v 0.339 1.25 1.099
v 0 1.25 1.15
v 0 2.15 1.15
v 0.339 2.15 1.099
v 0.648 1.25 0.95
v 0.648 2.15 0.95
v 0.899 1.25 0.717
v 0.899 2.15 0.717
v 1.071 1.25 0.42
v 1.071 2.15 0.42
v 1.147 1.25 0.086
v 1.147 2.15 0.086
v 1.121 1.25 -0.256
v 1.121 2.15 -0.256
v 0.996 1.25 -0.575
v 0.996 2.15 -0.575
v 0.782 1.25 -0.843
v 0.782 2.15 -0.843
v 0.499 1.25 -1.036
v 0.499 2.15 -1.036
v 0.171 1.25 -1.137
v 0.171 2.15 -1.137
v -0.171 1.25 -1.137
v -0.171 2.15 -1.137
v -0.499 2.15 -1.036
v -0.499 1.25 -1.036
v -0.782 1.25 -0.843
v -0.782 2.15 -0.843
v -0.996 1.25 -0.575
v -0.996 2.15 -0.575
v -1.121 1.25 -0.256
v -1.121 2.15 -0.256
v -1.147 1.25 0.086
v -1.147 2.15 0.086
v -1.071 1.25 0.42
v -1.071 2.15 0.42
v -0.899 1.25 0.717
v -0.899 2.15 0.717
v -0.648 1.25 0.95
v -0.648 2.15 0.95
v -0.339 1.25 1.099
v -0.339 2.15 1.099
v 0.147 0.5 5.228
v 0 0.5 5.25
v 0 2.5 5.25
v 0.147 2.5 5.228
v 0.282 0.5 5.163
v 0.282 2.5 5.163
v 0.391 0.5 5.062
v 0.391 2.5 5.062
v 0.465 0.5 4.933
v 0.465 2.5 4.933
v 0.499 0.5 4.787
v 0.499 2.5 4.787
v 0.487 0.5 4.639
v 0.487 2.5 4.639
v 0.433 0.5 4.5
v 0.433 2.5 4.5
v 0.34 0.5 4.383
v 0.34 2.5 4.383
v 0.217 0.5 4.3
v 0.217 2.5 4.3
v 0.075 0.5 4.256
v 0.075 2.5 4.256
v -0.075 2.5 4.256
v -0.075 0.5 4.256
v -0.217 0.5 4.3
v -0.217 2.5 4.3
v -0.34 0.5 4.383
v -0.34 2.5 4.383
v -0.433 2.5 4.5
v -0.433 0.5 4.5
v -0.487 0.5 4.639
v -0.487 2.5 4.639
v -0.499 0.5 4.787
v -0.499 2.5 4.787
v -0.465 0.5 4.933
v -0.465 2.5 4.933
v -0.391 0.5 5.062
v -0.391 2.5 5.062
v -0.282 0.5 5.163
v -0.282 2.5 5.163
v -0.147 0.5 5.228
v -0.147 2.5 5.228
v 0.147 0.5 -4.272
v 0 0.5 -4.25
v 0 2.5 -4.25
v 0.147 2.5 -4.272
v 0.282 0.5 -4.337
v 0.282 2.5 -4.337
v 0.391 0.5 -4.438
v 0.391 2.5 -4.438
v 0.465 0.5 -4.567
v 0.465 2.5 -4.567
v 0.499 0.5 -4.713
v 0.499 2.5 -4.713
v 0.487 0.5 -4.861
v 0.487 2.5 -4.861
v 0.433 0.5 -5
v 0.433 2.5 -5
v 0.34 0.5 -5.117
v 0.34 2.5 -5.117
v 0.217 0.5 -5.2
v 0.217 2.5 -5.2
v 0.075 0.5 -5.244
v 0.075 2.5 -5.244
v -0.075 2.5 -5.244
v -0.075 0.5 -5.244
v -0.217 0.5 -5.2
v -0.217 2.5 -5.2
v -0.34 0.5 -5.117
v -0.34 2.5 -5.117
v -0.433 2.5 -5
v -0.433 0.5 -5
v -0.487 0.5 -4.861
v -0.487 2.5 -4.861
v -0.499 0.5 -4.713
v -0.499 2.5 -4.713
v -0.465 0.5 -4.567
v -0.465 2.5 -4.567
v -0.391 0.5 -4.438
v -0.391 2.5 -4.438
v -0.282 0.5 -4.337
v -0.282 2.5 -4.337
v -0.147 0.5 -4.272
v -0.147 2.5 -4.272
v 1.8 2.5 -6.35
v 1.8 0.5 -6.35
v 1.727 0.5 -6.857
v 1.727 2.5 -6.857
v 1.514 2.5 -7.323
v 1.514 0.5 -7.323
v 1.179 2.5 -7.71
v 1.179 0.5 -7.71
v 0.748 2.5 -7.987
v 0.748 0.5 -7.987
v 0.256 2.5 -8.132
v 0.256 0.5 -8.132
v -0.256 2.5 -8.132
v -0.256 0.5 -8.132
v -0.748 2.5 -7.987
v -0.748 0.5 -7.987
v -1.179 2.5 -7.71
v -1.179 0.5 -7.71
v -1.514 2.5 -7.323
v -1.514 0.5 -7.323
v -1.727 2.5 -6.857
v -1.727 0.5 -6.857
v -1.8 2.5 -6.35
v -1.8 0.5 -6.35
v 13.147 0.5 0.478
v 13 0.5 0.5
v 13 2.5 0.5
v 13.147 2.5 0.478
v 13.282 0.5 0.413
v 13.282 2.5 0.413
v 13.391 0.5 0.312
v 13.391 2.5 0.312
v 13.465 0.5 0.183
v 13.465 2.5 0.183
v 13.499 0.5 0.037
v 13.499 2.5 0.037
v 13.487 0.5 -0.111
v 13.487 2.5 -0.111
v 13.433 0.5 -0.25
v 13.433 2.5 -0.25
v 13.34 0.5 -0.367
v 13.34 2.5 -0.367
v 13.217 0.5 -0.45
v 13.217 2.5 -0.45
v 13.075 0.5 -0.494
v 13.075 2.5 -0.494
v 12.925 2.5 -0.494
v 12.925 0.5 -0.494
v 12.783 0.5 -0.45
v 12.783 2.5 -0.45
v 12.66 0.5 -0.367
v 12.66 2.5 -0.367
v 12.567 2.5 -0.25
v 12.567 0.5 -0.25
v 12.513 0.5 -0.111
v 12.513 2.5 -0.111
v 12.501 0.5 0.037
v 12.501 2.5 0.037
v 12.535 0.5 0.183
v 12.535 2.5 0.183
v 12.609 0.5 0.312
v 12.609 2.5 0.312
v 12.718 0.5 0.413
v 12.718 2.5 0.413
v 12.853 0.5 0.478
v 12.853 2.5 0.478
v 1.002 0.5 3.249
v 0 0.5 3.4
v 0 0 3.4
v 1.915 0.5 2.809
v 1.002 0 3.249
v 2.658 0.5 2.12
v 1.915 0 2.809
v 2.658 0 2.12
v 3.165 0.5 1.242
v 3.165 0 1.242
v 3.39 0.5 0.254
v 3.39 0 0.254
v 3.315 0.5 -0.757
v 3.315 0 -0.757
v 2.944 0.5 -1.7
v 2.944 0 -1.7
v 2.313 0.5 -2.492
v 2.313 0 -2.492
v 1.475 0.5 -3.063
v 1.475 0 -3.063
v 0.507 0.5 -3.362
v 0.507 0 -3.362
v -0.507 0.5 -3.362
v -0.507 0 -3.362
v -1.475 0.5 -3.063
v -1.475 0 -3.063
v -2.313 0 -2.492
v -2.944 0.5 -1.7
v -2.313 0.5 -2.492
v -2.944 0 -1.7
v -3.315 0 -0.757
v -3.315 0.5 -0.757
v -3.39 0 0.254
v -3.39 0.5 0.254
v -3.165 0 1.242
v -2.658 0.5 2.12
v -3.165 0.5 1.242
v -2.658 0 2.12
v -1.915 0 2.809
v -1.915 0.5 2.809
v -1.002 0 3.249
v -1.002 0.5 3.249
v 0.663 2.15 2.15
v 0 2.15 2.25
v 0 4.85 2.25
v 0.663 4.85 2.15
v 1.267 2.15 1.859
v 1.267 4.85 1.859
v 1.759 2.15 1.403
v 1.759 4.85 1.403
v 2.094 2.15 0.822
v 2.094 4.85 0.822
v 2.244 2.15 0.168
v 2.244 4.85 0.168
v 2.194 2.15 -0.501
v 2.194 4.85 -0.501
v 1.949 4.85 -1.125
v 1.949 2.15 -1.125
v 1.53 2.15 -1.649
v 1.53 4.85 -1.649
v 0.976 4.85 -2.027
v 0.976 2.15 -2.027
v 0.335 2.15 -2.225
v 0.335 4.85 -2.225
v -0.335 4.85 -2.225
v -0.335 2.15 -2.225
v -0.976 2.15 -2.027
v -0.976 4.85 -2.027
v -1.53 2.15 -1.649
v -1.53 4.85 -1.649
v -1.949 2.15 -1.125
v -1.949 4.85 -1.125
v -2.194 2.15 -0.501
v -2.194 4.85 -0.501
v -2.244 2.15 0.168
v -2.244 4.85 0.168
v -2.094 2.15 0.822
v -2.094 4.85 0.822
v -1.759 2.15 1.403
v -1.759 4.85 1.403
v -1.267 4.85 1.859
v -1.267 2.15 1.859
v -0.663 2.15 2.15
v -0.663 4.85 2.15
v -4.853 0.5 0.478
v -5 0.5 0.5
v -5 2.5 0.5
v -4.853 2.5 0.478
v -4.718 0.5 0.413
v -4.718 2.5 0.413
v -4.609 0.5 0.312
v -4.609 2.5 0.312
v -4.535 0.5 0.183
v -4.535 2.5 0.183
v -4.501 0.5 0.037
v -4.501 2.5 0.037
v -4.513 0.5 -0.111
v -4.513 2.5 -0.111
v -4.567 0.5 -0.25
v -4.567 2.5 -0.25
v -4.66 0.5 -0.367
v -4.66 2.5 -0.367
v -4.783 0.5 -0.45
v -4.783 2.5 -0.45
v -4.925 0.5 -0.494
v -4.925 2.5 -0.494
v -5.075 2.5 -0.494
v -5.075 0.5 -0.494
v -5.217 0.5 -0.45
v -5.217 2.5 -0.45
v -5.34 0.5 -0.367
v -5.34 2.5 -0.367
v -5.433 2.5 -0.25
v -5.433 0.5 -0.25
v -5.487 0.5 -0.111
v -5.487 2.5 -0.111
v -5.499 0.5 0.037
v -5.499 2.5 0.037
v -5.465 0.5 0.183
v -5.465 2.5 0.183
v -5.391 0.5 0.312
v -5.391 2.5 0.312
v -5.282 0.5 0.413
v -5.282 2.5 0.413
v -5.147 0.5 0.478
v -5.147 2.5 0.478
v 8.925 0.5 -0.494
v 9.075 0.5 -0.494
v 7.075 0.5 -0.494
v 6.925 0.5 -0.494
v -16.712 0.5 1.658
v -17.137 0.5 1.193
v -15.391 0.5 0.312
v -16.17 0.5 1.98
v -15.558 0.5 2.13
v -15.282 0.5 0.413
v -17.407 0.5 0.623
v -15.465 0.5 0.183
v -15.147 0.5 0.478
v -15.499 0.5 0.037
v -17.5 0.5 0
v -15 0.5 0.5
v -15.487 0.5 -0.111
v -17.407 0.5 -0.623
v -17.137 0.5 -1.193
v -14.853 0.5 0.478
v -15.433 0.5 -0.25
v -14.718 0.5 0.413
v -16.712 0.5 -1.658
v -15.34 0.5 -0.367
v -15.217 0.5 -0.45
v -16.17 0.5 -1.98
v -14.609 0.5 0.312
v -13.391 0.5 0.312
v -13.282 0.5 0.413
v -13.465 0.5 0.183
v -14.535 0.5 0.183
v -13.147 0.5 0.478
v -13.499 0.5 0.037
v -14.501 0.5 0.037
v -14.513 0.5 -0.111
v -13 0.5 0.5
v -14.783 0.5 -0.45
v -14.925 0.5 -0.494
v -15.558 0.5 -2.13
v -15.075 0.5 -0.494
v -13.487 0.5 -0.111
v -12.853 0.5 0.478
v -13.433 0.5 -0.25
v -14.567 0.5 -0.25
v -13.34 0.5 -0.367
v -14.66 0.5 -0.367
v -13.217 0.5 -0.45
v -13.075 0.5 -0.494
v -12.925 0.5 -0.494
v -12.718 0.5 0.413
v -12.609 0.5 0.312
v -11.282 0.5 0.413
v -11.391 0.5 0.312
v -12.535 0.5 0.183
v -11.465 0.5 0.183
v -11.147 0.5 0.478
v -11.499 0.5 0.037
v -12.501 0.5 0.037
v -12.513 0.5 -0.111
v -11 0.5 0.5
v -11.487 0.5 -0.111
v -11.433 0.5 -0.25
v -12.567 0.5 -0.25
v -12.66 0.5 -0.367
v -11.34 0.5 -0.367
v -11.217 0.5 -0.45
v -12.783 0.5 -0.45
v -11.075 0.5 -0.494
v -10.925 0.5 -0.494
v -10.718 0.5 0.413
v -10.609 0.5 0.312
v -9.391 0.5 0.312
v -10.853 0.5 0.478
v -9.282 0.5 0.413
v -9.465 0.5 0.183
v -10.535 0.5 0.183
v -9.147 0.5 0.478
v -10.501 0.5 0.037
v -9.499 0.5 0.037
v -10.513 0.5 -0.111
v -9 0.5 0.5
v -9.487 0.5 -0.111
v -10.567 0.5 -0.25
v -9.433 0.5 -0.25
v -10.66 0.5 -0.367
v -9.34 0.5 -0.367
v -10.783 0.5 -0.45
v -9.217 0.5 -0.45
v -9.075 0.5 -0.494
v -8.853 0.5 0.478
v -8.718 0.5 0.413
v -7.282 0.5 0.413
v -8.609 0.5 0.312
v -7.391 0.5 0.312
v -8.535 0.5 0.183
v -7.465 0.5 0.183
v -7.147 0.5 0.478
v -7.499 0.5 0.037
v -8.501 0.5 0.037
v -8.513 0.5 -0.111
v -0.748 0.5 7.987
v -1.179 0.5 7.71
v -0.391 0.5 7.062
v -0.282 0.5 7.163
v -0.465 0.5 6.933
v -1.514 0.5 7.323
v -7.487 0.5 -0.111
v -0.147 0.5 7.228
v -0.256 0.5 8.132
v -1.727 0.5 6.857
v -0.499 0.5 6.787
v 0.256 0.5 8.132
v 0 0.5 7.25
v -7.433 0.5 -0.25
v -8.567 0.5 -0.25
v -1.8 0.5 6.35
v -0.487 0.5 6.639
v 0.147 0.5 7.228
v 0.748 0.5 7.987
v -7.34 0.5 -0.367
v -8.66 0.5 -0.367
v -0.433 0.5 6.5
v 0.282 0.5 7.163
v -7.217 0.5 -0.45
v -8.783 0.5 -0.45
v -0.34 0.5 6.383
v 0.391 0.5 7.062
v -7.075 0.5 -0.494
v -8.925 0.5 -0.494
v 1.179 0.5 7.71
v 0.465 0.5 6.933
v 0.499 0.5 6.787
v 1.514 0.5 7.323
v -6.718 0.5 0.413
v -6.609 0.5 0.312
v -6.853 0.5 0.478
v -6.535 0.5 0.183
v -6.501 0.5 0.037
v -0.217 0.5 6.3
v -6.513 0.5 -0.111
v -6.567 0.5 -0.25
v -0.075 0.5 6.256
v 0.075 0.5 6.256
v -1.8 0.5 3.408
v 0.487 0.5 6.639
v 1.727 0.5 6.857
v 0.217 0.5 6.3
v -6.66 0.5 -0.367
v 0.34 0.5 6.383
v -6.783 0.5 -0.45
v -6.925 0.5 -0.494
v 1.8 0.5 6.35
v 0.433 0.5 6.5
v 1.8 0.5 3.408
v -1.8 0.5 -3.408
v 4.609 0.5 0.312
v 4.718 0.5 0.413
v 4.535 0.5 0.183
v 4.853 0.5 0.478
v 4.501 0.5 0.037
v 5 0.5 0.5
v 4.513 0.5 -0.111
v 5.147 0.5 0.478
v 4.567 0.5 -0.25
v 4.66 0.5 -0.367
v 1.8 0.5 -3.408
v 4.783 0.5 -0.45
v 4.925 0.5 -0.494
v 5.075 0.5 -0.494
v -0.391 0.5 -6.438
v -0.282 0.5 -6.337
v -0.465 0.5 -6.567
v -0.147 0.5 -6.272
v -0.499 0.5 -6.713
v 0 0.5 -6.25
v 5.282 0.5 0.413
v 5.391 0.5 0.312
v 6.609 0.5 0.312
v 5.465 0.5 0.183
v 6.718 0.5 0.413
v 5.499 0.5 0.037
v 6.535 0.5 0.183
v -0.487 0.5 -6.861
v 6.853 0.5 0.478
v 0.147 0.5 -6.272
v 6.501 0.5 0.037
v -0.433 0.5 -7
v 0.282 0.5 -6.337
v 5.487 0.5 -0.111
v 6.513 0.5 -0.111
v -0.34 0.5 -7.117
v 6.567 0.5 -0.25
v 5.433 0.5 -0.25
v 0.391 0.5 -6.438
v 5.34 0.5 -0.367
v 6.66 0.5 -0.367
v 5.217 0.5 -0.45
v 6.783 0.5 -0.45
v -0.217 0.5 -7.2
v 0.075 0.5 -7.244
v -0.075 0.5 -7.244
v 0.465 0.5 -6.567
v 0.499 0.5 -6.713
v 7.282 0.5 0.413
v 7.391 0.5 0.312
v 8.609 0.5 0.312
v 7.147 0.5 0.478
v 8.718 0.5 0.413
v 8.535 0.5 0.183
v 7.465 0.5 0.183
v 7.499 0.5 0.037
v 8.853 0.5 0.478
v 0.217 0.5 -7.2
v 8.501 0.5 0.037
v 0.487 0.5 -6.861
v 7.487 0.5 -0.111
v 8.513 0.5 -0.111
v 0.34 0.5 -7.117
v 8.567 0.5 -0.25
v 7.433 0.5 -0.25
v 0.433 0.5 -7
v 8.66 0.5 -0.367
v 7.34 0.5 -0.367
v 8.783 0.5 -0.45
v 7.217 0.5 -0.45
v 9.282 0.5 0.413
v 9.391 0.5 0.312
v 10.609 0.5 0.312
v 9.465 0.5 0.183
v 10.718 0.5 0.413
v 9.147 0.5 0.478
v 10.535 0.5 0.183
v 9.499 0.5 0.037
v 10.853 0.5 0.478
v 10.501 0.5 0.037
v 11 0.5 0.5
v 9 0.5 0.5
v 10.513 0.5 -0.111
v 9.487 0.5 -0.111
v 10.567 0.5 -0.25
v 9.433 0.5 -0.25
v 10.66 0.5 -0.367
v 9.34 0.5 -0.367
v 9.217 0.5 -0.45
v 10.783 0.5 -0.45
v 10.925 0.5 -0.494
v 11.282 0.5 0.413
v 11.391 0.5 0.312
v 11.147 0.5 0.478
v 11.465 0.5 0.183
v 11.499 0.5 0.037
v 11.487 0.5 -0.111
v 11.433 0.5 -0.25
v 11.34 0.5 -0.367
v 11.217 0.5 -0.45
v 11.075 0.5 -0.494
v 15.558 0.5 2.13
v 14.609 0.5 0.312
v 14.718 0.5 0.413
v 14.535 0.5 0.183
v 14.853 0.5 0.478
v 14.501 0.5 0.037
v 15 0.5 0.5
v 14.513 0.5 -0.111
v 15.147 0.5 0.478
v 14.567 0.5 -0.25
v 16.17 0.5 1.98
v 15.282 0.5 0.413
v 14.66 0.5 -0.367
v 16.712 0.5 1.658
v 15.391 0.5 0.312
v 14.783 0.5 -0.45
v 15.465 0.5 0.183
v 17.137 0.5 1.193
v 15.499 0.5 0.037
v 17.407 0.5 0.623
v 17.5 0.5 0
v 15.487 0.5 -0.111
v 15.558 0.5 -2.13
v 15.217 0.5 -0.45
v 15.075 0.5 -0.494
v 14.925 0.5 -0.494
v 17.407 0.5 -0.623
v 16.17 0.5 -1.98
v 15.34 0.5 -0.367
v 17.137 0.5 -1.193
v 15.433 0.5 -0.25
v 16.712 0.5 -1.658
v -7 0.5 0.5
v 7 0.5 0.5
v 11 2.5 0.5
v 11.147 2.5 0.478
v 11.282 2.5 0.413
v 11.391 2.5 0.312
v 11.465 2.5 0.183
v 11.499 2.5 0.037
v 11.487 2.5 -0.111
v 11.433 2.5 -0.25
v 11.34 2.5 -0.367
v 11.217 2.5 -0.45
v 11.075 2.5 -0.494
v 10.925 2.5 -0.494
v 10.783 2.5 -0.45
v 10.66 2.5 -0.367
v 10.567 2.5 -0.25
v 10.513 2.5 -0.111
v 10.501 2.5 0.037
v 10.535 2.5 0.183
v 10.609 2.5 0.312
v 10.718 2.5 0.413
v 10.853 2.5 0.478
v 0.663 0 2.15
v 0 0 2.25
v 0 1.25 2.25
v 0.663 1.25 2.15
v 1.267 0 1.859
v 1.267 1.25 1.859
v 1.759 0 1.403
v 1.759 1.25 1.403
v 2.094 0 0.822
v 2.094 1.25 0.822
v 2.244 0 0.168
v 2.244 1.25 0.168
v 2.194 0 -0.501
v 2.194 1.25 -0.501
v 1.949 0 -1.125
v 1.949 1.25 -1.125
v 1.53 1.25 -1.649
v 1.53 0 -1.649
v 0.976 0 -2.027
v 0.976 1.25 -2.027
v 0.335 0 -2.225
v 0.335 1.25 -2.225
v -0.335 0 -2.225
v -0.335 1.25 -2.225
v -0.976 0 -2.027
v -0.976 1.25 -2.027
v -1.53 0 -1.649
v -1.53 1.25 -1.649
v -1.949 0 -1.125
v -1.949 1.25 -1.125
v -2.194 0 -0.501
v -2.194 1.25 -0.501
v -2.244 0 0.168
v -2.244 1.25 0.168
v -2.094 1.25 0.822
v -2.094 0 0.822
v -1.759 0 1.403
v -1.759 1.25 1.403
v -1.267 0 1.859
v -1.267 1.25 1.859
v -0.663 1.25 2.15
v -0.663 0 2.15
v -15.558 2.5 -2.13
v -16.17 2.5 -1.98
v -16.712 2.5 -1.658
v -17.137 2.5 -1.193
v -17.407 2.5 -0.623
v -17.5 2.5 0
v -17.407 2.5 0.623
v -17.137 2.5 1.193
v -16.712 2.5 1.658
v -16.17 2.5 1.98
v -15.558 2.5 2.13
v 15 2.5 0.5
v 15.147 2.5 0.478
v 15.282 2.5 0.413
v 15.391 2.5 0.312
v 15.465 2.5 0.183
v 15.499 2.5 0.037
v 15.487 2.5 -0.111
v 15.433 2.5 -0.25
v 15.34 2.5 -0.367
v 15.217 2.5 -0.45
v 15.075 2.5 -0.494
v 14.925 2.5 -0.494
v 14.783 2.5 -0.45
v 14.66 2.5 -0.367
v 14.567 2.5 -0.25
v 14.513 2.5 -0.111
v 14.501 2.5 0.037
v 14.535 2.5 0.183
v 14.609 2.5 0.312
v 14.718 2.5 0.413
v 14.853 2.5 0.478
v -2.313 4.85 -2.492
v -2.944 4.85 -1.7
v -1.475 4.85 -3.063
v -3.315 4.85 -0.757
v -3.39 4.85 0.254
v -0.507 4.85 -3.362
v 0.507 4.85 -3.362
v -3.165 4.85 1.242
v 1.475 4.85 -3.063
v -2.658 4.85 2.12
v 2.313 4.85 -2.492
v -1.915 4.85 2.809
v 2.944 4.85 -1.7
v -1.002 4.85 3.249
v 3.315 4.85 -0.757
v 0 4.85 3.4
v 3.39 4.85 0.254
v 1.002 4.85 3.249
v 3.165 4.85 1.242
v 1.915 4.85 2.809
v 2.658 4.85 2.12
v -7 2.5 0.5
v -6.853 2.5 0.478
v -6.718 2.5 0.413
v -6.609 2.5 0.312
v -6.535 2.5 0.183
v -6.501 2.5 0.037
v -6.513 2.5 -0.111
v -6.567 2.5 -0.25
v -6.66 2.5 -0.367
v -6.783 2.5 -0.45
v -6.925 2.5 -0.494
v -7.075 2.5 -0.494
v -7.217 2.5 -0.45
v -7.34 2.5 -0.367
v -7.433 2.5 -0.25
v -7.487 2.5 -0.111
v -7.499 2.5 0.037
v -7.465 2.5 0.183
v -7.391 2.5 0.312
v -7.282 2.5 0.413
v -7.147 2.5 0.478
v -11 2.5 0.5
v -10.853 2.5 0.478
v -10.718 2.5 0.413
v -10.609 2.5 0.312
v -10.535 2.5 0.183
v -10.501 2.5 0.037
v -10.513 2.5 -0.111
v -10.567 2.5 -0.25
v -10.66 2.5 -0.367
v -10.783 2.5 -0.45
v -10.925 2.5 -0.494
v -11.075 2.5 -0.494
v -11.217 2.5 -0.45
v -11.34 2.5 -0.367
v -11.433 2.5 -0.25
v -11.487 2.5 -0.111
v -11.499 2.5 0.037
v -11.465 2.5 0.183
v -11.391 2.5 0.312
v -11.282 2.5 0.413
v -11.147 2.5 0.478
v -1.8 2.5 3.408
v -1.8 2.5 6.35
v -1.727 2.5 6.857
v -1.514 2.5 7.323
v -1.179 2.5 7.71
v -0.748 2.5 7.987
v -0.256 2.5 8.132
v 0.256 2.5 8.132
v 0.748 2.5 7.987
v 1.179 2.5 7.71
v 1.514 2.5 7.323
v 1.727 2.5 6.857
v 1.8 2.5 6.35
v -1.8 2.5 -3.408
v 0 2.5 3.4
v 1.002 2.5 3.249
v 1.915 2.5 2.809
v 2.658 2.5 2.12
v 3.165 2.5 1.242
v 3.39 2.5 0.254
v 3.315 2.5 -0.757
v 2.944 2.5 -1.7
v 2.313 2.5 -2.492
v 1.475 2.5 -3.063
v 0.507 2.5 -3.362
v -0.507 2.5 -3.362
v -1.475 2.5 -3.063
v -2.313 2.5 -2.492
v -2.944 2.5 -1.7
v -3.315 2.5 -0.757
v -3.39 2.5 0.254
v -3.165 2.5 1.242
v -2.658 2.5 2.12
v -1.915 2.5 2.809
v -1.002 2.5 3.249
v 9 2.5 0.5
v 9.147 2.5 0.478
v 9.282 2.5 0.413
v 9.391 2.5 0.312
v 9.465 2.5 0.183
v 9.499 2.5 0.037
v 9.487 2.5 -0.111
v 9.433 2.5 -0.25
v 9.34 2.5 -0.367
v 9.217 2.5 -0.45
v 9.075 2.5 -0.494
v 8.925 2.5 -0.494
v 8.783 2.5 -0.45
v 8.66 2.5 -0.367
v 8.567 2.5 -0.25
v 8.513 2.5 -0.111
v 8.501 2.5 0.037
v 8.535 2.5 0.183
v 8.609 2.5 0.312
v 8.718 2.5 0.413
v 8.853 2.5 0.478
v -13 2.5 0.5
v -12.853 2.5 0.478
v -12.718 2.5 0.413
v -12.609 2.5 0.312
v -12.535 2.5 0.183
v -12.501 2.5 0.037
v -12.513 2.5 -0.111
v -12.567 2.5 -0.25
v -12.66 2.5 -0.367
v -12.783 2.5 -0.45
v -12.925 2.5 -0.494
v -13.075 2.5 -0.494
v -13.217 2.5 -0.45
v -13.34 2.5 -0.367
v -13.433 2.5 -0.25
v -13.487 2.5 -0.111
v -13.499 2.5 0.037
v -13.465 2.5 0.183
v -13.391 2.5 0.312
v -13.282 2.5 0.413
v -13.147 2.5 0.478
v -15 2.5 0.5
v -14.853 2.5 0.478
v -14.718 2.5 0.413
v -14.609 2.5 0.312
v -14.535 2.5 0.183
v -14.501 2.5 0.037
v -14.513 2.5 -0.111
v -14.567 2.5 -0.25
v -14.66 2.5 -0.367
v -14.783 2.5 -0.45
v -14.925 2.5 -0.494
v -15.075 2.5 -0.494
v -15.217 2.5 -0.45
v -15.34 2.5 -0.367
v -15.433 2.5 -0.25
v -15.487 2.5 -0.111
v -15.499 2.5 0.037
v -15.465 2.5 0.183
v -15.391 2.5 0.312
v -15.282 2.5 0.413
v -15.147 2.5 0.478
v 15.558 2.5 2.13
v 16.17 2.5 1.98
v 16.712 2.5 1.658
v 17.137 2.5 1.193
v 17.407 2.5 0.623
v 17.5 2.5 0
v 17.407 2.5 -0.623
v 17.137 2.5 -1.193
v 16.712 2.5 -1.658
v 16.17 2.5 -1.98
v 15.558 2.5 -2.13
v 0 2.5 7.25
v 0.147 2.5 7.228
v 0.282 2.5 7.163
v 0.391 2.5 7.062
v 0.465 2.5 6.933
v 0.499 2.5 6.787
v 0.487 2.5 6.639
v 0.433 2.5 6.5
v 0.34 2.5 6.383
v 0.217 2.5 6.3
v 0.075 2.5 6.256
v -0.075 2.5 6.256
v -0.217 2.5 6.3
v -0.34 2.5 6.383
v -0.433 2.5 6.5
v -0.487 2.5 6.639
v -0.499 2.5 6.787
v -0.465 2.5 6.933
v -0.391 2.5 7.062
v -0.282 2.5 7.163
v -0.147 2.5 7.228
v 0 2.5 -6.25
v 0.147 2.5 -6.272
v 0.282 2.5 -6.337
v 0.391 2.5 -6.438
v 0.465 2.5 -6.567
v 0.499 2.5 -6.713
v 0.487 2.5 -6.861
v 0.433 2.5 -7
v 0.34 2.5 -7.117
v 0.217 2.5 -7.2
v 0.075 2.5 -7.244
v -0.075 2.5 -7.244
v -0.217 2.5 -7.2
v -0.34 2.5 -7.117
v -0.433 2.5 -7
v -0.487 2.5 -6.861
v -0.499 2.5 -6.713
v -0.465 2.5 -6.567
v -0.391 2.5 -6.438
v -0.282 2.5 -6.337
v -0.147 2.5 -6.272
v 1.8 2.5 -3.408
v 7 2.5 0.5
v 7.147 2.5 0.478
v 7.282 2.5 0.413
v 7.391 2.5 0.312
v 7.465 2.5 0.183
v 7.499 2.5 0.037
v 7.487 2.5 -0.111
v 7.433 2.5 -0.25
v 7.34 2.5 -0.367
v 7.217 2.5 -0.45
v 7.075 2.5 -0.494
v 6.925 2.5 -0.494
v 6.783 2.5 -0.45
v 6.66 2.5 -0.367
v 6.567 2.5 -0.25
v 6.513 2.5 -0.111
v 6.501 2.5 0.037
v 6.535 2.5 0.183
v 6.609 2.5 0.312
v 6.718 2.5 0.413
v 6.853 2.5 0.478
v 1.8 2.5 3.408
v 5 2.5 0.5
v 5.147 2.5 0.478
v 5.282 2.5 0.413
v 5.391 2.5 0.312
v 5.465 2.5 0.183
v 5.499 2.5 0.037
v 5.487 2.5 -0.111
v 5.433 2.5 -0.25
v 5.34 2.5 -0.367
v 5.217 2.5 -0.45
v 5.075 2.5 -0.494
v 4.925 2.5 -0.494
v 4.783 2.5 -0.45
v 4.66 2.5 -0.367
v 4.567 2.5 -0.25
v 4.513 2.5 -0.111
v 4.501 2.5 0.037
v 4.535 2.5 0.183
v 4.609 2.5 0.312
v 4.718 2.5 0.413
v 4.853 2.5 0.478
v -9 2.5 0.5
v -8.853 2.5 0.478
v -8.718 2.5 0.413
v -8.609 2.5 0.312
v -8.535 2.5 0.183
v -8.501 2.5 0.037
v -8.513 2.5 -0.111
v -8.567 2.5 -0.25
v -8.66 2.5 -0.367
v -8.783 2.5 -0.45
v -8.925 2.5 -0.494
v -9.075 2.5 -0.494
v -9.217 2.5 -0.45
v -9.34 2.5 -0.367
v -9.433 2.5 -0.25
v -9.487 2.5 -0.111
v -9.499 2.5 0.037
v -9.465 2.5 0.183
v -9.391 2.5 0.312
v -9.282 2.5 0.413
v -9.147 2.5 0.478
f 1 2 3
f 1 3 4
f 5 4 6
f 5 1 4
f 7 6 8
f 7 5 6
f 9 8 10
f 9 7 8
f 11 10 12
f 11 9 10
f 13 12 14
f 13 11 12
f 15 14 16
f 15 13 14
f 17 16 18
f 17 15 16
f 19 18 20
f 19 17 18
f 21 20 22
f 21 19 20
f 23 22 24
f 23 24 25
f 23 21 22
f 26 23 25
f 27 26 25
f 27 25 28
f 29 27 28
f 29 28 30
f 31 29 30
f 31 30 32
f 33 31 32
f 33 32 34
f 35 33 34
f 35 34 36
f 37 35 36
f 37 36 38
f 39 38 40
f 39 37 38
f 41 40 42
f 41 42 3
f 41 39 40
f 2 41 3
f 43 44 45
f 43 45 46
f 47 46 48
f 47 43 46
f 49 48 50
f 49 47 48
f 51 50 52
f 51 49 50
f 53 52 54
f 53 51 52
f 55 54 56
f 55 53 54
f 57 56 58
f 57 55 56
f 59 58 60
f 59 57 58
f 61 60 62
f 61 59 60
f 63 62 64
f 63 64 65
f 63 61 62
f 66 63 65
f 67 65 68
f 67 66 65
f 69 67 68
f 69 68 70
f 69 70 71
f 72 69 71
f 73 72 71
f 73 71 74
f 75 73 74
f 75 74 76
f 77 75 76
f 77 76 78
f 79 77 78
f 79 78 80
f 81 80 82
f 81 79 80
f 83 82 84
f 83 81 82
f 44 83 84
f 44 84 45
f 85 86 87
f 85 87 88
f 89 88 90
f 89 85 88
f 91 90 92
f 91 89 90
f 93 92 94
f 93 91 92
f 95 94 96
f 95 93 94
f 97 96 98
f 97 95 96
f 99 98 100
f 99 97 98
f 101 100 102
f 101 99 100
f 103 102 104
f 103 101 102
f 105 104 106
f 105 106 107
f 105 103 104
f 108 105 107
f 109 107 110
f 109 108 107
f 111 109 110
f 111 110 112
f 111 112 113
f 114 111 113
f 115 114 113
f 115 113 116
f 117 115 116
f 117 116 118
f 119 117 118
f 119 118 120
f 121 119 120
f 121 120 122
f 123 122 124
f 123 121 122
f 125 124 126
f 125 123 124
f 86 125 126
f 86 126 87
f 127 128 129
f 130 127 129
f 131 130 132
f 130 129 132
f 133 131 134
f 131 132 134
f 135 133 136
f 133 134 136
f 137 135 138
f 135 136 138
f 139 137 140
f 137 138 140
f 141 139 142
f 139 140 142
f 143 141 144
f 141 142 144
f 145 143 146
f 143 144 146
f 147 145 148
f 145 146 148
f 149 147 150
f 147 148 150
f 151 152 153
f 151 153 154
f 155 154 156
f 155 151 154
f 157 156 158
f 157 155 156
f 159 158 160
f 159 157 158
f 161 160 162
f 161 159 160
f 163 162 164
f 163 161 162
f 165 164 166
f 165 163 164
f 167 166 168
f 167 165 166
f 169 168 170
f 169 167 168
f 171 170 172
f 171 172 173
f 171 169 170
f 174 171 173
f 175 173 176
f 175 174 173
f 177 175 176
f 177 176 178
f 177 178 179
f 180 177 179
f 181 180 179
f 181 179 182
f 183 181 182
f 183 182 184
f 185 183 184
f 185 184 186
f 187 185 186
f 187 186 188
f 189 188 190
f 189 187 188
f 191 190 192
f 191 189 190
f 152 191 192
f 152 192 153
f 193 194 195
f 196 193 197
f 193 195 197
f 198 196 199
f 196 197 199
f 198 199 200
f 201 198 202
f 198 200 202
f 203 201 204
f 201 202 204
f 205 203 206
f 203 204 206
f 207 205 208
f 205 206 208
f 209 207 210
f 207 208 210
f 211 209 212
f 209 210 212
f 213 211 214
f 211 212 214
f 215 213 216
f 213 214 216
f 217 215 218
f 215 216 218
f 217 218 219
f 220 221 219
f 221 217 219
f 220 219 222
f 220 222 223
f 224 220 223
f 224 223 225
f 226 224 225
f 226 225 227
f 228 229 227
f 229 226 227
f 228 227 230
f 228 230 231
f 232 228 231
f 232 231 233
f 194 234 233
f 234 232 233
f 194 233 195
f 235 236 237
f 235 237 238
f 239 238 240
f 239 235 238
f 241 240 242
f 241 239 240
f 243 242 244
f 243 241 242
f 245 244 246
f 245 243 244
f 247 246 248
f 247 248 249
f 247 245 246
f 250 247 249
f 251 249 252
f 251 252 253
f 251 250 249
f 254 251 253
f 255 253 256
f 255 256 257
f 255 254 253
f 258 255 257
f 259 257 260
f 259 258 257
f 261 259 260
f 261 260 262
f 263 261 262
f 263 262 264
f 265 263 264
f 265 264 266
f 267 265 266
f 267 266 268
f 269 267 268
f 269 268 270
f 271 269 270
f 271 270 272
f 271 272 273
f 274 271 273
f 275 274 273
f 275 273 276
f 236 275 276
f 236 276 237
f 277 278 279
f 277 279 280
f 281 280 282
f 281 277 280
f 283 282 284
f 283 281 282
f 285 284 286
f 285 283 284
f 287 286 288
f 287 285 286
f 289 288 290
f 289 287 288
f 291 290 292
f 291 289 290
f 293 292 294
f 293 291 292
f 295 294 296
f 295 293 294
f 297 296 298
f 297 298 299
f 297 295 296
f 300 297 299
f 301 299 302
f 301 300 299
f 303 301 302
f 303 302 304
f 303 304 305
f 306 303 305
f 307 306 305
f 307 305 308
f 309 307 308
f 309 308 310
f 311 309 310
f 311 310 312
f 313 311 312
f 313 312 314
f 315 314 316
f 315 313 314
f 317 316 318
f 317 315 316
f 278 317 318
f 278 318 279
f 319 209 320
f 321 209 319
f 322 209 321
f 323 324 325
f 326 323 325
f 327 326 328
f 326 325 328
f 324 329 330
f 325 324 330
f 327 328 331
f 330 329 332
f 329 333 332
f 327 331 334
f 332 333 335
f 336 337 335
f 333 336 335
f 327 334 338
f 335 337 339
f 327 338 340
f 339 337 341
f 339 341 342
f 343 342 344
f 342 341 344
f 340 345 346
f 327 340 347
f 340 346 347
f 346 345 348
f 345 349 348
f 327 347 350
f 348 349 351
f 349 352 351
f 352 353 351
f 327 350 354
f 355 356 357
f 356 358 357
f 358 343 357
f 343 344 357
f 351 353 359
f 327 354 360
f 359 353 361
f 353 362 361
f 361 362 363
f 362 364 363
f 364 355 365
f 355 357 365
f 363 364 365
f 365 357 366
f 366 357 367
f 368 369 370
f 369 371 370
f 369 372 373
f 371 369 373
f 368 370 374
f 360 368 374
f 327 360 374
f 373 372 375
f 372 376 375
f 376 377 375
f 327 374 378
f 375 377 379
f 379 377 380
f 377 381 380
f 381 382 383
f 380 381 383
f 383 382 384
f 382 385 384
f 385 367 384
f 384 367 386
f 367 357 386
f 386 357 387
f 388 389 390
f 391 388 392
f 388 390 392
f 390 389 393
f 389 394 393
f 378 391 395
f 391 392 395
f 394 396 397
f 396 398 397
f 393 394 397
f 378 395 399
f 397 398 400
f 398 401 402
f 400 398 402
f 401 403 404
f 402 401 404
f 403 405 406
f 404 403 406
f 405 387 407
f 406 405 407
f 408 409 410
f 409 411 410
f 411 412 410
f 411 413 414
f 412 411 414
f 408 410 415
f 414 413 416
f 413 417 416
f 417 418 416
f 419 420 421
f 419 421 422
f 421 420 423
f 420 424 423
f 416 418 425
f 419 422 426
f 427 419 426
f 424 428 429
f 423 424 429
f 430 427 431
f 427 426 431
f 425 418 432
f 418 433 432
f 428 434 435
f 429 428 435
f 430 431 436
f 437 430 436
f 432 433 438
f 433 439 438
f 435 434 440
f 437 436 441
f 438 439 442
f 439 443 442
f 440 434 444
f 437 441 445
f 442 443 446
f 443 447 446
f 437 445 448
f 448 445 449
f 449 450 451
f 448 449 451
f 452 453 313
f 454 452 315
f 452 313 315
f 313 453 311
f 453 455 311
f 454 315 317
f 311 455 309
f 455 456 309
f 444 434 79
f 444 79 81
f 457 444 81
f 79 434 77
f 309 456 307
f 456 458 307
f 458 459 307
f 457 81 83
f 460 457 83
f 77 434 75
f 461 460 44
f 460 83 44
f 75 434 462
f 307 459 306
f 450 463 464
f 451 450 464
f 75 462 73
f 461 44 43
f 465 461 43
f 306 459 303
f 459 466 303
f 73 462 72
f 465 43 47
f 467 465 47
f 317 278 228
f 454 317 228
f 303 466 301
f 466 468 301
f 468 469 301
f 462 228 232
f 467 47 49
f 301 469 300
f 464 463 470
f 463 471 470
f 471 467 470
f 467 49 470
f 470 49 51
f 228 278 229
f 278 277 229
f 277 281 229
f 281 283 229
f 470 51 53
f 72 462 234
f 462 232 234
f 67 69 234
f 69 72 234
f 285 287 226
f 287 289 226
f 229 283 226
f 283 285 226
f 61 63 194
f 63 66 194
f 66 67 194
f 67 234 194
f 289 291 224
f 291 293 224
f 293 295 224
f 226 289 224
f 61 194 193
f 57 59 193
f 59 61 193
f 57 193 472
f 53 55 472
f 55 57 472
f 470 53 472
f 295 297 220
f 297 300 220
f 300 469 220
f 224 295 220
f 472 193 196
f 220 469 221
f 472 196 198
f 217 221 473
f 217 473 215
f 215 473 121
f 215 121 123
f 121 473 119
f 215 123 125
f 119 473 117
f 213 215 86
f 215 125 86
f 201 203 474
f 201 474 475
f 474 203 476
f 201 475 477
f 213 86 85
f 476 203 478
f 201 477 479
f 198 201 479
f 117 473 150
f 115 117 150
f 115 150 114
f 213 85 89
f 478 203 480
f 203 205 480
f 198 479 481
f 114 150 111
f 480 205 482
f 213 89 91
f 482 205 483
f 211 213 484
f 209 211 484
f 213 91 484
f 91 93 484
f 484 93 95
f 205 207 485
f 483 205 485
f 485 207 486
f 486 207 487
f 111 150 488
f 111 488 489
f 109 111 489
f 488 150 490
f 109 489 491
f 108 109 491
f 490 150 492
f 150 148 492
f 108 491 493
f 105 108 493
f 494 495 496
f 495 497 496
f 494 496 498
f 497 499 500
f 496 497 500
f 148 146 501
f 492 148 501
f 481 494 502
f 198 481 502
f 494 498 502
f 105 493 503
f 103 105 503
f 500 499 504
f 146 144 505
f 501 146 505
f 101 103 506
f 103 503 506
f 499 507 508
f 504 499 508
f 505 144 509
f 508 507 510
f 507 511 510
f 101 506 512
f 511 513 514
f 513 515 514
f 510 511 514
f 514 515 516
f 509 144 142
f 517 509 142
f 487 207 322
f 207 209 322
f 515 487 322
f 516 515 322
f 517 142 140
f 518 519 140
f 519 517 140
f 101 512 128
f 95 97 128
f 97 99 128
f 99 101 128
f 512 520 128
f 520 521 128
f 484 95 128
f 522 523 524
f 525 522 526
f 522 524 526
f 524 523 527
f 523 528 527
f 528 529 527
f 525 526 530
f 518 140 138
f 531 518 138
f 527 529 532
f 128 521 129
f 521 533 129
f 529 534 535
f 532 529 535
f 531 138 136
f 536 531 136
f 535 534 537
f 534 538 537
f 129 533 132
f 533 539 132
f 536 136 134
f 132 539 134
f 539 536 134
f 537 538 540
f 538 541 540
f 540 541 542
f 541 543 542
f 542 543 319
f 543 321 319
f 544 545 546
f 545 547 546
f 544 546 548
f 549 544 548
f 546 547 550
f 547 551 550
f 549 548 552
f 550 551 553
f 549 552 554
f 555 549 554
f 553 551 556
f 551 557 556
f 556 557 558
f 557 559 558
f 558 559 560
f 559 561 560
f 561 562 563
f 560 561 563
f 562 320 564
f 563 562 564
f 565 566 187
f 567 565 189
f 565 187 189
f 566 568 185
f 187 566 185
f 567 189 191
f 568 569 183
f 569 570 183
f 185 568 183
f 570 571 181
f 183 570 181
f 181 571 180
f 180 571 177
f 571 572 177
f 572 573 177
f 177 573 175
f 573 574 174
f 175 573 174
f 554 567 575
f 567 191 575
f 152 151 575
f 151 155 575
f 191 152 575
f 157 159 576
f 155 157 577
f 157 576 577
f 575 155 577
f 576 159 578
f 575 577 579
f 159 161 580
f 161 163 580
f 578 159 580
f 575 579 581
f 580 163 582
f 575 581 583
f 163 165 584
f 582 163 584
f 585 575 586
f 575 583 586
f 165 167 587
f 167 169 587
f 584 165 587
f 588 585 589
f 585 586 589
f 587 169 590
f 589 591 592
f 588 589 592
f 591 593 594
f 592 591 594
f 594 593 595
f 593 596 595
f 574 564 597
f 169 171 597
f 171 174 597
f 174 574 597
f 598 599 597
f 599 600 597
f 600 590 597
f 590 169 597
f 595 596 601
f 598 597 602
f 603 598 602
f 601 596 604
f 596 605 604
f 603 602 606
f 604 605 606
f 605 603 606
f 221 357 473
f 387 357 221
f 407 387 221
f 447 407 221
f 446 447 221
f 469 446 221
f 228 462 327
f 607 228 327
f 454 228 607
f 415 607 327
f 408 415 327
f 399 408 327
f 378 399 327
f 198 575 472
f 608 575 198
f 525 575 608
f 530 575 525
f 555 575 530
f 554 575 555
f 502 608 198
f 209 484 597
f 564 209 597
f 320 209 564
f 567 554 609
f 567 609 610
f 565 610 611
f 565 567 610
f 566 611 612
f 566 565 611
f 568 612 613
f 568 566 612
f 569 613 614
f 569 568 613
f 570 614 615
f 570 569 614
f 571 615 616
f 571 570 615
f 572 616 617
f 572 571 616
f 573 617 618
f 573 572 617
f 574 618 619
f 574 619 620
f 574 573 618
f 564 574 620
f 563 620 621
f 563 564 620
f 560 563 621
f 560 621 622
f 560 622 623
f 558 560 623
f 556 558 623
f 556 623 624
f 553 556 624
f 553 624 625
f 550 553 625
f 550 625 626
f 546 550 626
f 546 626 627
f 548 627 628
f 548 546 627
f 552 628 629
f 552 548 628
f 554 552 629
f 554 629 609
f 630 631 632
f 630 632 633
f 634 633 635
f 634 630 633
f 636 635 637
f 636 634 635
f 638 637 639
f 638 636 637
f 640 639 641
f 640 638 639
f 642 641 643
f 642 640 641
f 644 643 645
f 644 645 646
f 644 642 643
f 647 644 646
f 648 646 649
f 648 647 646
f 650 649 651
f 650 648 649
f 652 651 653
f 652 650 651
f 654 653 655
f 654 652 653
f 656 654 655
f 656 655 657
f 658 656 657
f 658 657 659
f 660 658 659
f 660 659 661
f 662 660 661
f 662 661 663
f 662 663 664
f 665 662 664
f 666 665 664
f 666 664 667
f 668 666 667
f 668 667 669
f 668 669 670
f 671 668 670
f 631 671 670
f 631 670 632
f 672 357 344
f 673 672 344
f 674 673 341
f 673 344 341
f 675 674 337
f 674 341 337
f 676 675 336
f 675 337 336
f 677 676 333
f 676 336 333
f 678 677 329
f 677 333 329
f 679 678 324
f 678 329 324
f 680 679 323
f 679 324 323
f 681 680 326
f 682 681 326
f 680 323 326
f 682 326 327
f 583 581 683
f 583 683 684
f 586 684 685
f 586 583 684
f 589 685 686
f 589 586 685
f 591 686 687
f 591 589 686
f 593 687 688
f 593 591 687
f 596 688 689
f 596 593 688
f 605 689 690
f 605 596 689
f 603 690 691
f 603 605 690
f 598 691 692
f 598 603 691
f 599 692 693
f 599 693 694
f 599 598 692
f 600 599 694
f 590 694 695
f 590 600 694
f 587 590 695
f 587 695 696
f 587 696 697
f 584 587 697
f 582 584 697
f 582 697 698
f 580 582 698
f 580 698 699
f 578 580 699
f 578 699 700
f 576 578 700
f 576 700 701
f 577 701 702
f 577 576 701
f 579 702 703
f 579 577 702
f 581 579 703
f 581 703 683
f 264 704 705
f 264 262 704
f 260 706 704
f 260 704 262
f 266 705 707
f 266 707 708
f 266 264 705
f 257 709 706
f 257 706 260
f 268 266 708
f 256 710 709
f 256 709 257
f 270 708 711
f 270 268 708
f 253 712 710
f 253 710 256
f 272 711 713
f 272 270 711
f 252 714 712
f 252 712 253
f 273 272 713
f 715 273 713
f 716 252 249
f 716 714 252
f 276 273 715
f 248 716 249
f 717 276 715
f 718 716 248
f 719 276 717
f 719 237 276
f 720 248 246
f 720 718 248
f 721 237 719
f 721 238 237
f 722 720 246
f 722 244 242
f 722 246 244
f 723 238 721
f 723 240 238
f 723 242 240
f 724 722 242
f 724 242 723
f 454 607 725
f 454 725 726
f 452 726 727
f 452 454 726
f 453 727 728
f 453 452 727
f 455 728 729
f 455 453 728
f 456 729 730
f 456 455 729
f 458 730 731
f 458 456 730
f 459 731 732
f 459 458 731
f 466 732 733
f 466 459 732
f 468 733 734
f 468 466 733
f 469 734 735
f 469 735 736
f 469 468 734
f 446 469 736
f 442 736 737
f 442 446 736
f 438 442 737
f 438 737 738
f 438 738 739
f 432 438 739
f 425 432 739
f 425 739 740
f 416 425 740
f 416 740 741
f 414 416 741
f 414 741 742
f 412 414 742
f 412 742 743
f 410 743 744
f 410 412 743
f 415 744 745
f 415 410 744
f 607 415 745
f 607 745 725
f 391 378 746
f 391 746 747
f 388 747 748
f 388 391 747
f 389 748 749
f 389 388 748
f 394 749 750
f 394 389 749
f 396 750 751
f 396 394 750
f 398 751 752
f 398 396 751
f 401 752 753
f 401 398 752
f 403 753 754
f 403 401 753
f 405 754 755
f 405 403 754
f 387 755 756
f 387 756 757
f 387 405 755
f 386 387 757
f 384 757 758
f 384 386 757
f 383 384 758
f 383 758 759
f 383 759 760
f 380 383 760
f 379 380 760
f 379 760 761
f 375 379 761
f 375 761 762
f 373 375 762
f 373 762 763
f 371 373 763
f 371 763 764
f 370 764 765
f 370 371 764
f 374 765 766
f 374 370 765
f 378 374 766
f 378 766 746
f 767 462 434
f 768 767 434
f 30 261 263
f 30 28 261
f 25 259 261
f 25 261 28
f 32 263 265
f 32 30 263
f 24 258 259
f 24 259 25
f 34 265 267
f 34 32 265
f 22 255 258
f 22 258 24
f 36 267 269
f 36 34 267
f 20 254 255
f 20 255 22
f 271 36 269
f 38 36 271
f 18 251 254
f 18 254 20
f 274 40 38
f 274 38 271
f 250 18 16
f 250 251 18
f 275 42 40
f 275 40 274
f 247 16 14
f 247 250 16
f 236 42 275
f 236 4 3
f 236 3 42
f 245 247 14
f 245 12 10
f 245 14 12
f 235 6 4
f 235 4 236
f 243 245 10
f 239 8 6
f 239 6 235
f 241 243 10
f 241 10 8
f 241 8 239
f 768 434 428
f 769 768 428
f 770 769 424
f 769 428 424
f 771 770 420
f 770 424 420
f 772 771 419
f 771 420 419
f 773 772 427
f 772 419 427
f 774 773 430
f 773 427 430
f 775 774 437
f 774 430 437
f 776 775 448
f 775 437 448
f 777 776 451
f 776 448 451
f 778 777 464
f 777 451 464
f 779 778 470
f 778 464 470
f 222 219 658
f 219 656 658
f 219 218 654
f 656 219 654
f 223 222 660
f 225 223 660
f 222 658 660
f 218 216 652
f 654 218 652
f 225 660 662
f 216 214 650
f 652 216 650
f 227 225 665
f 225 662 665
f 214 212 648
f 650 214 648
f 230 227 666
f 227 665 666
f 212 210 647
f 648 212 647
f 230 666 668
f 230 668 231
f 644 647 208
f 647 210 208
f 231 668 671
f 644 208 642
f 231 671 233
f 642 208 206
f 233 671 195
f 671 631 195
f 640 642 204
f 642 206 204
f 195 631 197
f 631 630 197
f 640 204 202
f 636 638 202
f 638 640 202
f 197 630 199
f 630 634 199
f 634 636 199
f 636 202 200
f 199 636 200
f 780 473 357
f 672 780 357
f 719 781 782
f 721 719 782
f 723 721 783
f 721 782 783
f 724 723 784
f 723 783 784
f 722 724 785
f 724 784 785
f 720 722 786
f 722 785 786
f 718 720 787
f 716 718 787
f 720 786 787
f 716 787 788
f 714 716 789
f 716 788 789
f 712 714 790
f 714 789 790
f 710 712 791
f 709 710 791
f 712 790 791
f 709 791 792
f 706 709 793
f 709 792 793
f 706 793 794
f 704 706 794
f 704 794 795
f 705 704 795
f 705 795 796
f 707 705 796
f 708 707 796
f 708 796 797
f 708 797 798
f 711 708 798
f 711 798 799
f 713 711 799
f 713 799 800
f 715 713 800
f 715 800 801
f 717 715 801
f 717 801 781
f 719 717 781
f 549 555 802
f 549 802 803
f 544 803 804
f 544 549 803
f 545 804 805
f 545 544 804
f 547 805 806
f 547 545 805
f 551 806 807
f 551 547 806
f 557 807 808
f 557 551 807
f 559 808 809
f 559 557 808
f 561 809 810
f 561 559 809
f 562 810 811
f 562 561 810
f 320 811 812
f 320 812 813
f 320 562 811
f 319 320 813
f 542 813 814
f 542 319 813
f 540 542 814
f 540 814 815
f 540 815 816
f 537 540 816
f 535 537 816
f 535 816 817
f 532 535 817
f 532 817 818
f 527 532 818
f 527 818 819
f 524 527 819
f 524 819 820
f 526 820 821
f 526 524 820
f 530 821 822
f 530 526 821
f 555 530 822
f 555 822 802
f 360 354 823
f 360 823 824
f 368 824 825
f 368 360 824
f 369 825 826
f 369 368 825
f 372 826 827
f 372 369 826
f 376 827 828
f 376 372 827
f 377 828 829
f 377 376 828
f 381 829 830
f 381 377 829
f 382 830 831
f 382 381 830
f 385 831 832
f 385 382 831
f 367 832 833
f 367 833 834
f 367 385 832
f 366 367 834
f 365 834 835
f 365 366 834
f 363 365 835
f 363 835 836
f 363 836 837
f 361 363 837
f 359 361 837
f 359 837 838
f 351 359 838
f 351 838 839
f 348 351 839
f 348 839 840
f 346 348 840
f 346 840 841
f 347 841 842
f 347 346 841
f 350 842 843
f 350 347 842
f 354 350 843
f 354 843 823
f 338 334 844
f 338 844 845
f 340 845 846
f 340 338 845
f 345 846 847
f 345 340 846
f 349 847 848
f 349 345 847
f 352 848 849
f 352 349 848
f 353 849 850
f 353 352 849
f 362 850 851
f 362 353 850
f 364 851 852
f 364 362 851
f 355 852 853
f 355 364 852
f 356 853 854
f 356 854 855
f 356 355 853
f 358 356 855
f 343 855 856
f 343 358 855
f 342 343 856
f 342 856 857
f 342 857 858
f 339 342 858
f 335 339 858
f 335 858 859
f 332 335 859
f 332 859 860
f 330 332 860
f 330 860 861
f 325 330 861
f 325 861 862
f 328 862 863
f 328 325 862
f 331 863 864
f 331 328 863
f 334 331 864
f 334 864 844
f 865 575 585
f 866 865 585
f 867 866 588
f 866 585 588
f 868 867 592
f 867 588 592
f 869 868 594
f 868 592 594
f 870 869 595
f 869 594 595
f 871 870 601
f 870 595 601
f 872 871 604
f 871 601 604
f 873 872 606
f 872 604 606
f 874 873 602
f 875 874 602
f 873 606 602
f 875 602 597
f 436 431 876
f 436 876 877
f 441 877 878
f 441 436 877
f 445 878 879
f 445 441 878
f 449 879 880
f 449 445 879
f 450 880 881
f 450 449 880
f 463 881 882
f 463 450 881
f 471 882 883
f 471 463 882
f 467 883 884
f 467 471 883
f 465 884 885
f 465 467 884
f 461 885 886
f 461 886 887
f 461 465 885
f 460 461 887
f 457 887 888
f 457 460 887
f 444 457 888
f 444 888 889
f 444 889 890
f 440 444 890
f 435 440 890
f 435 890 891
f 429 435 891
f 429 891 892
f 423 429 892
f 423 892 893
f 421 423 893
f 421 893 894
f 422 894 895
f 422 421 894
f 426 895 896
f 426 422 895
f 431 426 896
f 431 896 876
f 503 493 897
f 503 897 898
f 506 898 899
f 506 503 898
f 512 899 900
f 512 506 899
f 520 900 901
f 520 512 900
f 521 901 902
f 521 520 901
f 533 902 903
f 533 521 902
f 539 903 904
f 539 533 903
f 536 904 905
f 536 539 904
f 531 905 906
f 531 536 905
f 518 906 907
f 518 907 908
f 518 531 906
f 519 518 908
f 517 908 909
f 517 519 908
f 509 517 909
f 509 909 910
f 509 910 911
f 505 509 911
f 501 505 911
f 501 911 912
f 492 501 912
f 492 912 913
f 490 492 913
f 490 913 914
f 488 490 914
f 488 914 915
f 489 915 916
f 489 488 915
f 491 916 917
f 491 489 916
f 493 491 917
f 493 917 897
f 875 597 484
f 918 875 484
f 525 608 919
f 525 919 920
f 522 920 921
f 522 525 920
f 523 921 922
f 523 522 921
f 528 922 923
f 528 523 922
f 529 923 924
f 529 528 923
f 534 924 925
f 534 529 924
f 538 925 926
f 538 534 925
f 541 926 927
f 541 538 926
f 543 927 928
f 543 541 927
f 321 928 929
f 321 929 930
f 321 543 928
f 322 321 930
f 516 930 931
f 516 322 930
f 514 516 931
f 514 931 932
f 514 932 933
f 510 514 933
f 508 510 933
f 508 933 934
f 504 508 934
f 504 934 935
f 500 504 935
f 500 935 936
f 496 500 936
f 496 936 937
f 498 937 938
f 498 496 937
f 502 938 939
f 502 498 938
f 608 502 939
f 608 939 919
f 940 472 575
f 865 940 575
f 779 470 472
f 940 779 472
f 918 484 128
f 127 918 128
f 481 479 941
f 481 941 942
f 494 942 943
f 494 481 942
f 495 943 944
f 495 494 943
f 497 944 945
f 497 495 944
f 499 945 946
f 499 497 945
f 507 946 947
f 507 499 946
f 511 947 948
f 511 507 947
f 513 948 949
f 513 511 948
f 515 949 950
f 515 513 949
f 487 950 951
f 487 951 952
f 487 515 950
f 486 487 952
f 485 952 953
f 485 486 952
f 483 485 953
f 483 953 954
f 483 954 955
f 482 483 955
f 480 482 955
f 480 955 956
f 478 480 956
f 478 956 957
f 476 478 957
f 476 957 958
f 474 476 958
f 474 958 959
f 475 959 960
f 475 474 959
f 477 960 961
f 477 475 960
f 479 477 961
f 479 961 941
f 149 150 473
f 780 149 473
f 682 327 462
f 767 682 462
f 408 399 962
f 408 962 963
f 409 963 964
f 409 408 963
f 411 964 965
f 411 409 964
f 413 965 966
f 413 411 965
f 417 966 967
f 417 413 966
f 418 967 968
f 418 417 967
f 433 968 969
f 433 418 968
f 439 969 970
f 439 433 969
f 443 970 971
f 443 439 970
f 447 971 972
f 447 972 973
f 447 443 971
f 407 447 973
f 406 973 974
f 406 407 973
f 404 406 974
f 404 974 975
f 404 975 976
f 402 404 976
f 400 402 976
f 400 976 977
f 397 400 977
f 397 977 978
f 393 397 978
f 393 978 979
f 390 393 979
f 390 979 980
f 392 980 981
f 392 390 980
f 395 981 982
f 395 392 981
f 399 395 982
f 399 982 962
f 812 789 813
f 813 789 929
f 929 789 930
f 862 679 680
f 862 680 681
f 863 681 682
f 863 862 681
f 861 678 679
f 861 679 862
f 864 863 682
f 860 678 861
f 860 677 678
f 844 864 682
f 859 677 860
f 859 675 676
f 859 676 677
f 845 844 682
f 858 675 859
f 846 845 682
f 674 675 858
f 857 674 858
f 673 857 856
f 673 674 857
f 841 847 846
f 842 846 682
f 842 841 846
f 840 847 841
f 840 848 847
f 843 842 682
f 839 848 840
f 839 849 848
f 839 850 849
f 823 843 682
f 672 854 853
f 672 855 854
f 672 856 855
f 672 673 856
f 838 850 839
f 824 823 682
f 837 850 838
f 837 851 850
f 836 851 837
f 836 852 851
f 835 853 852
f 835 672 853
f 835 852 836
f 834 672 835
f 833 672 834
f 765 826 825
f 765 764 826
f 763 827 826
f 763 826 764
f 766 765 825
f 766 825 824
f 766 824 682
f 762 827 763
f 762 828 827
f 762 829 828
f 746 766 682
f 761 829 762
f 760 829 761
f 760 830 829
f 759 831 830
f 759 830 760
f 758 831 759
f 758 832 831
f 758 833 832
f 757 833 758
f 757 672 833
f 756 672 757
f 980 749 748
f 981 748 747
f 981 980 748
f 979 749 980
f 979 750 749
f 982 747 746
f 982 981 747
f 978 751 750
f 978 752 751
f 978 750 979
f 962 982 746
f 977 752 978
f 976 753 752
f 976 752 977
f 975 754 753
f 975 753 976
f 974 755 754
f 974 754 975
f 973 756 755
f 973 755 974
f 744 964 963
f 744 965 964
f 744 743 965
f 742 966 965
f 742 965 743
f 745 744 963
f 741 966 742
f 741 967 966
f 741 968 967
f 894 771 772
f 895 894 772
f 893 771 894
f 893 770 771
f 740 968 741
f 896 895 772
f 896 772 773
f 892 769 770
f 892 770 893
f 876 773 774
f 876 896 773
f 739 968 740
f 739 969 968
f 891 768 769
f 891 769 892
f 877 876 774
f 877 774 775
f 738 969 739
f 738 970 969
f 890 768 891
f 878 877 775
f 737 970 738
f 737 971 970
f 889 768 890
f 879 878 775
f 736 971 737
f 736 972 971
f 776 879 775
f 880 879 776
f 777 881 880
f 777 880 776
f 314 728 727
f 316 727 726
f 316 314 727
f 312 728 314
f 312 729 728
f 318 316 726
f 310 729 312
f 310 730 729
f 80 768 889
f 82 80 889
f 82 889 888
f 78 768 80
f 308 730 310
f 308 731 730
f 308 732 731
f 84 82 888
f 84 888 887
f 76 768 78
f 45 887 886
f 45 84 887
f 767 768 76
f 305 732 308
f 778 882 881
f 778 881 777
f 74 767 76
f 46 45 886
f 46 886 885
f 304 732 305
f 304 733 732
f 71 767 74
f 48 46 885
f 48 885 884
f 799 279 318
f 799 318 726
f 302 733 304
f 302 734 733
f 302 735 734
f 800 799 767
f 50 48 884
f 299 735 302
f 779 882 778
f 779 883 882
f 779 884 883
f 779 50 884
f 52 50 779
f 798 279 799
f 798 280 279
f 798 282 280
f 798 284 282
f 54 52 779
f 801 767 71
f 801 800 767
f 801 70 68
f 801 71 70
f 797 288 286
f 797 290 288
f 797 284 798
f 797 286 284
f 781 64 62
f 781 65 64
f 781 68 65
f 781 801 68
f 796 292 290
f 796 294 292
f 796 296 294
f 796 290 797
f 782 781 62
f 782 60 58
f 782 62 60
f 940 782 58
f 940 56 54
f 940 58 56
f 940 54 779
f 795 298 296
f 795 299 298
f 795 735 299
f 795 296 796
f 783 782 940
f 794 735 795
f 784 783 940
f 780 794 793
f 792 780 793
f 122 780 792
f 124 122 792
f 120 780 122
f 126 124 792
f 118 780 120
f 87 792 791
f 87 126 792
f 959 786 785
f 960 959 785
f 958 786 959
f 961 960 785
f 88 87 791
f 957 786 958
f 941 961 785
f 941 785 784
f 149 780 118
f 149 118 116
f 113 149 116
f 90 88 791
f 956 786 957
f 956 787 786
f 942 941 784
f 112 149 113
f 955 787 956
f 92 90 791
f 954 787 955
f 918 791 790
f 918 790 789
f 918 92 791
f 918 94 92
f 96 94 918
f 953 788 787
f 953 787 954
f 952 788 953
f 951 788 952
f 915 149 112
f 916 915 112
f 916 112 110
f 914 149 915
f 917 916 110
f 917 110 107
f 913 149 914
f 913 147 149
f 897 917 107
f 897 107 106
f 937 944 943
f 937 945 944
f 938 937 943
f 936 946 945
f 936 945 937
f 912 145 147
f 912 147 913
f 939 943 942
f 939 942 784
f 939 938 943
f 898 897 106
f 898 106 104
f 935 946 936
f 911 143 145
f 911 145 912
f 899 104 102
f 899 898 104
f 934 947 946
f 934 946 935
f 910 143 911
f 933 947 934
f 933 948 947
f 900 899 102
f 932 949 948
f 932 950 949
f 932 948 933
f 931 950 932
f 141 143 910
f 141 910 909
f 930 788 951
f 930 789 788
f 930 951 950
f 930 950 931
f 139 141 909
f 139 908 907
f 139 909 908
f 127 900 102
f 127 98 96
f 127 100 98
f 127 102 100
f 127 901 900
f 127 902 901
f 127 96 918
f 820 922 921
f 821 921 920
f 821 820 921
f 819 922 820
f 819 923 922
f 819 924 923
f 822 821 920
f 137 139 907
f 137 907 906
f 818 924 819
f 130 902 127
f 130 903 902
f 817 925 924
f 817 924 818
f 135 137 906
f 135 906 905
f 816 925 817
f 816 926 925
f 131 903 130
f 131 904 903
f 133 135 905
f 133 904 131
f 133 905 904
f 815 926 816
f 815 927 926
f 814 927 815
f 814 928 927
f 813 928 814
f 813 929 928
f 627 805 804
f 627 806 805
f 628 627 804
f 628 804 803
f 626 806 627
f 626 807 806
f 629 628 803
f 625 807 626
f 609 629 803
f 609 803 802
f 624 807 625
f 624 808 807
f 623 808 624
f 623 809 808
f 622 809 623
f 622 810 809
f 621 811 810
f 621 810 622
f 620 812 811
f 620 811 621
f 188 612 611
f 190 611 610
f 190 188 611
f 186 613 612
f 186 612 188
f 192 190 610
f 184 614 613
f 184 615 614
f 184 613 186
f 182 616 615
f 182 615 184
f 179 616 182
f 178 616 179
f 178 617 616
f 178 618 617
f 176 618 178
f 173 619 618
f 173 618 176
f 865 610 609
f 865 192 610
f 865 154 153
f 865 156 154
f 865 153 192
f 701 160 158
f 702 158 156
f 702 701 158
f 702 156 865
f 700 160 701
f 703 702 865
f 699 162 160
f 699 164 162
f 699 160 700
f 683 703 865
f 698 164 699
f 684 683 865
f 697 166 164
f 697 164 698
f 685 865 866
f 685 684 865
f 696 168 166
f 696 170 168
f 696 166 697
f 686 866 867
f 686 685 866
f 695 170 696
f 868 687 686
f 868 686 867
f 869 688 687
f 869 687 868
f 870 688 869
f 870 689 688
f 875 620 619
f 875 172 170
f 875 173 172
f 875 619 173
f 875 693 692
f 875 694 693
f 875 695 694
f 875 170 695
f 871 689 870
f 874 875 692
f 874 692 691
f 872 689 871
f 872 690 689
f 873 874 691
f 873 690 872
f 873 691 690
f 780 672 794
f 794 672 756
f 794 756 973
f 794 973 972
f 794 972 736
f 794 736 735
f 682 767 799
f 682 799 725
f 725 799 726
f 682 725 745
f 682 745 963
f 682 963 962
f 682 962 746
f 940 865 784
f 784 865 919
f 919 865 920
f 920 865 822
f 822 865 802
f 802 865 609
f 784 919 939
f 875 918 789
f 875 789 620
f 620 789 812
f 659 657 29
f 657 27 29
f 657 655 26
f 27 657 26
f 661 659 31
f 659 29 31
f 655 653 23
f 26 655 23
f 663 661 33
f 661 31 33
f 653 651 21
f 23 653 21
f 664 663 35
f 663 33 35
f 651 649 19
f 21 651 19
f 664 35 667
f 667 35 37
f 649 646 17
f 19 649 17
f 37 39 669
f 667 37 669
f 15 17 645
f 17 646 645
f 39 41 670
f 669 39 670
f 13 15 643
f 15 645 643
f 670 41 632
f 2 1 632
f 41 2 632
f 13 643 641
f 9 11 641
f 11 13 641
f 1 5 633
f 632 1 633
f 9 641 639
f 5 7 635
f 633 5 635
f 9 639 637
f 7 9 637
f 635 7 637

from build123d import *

# Parameters (mm, degrees)
SKETCH_1_R      = 3.4
SKETCH_1_R_2    = 2.25
EXTRUDE_1_DEPTH = 4.85
EXTRUDE_START   = 0.5
SKETCH_2_R      = 2.25
SKETCH_2_R_2    = 0.5
EXTRUDE_2_DEPTH = 2
EXTRUDE_START_2 = 1.25
SKETCH_3_R      = 2.25
SKETCH_3_R_2    = 1.15
EXTRUDE_3_DEPTH = 0.9


with BuildPart() as part:
    # 草图1 → 凸台-拉伸1 (new body)
    with BuildSketch(Plane(origin=(0, 0, 0), x_dir=(1, 0, 0), z_dir=(0, 1, 0))):
        with Locations(Location((0, 0, 0), (0, 0, 270))):
            Circle(SKETCH_1_R)
        with Locations(Location((0, 0, 0), (0, 0, 270))):
            Circle(SKETCH_1_R_2, mode=Mode.SUBTRACT)
    extrude(amount=EXTRUDE_1_DEPTH)

    # 草图2 → 凸台-拉伸2 (add)
    with BuildSketch(Plane(origin=(0, 0, 0), x_dir=(1, 0, 0), z_dir=(0, 1, 0)).offset(EXTRUDE_START)):
        with BuildLine():
            Line((1.799999992, 3.407857144), (1.799999992, 6.35))
            ThreePointArc((1.799999992, 6.35), (0, 8.149999992), (-1.799999992, 6.35))
            Line((-1.799999992, 6.35), (-1.799999992, 3.407857144))
            Line((-1.799999992, 3.407857144), (-15.558352909, 2.130295801))
            ThreePointArc((-15.558352909, 2.130295801), (-17.5, 0), (-15.558352909, -2.130295801))
            Line((-15.558352909, -2.130295801), (-1.799999992, -3.407857144))
            Line((-1.799999992, -3.407857144), (-1.799999992, -6.35))
            ThreePointArc((-1.799999992, -6.35), (0, -8.149999992), (1.799999992, -6.35))
            Line((1.799999992, -6.35), (1.799999992, -3.407857144))
            Line((1.799999992, -3.407857144), (15.558352909, -2.130295801))
            ThreePointArc((15.558352909, -2.130295801), (17.5, 0), (15.558352909, 2.130295801))
            Line((15.558352909, 2.130295801), (1.799999992, 3.407857144))
        make_face()
        with Locations(Location((0, 0, 0), (0, 0, 270))):
            Circle(SKETCH_2_R, mode=Mode.SUBTRACT)
        with Locations(Location((0, -6.75, 0), (0, 0, 270))):
            Circle(SKETCH_2_R_2, mode=Mode.SUBTRACT)
        with Locations(Location((0, -4.75, 0), (0, 0, 270))):
            Circle(SKETCH_2_R_2, mode=Mode.SUBTRACT)
        with Locations(Location((15, 0, 0), (0, 0, 270))):
            Circle(SKETCH_2_R_2, mode=Mode.SUBTRACT)
        with Locations(Location((13, 0, 0), (0, 0, 270))):
            Circle(SKETCH_2_R_2, mode=Mode.SUBTRACT)
        with Locations(Location((11, 0, 0), (0, 0, 270))):
            Circle(SKETCH_2_R_2, mode=Mode.SUBTRACT)
        with Locations(Location((9, 0, 0), (0, 0, 270))):
            Circle(SKETCH_2_R_2, mode=Mode.SUBTRACT)
        with Locations(Location((7, 0, 0), (0, 0, 270))):
            Circle(SKETCH_2_R_2, mode=Mode.SUBTRACT)
        with Locations(Location((5, 0, 0), (0, 0, 270))):
            Circle(SKETCH_2_R_2, mode=Mode.SUBTRACT)
        with Locations(Location((0, 6.75, 0), (0, 0, 270))):
            Circle(SKETCH_2_R_2, mode=Mode.SUBTRACT)
        with Locations(Location((0, 4.75, 0), (0, 0, 270))):
            Circle(SKETCH_2_R_2, mode=Mode.SUBTRACT)
        with Locations(Location((-5, 0, 0), (0, 0, 270))):
            Circle(SKETCH_2_R_2, mode=Mode.SUBTRACT)
        with Locations(Location((-7, 0, 0), (0, 0, 270))):
            Circle(SKETCH_2_R_2, mode=Mode.SUBTRACT)
        with Locations(Location((-9, 0, 0), (0, 0, 270))):
            Circle(SKETCH_2_R_2, mode=Mode.SUBTRACT)
        with Locations(Location((-11, 0, 0), (0, 0, 270))):
            Circle(SKETCH_2_R_2, mode=Mode.SUBTRACT)
        with Locations(Location((-13, 0, 0), (0, 0, 270))):
            Circle(SKETCH_2_R_2, mode=Mode.SUBTRACT)
        with Locations(Location((-15, 0, 0), (0, 0, 270))):
            Circle(SKETCH_2_R_2, mode=Mode.SUBTRACT)
    extrude(amount=EXTRUDE_2_DEPTH)

    # 草图3 → 凸台-拉伸3 (add)
    with BuildSketch(Plane(origin=(0, 0, 0), x_dir=(1, 0, 0), z_dir=(0, 1, 0)).offset(EXTRUDE_START_2)):
        with Locations(Location((0, 0, 0), (0, 0, 270))):
            Circle(SKETCH_3_R)
        with Locations(Location((0, 0, 0), (0, 0, 270))):
            Circle(SKETCH_3_R_2, mode=Mode.SUBTRACT)
    extrude(amount=EXTRUDE_3_DEPTH)


solid = part.part
